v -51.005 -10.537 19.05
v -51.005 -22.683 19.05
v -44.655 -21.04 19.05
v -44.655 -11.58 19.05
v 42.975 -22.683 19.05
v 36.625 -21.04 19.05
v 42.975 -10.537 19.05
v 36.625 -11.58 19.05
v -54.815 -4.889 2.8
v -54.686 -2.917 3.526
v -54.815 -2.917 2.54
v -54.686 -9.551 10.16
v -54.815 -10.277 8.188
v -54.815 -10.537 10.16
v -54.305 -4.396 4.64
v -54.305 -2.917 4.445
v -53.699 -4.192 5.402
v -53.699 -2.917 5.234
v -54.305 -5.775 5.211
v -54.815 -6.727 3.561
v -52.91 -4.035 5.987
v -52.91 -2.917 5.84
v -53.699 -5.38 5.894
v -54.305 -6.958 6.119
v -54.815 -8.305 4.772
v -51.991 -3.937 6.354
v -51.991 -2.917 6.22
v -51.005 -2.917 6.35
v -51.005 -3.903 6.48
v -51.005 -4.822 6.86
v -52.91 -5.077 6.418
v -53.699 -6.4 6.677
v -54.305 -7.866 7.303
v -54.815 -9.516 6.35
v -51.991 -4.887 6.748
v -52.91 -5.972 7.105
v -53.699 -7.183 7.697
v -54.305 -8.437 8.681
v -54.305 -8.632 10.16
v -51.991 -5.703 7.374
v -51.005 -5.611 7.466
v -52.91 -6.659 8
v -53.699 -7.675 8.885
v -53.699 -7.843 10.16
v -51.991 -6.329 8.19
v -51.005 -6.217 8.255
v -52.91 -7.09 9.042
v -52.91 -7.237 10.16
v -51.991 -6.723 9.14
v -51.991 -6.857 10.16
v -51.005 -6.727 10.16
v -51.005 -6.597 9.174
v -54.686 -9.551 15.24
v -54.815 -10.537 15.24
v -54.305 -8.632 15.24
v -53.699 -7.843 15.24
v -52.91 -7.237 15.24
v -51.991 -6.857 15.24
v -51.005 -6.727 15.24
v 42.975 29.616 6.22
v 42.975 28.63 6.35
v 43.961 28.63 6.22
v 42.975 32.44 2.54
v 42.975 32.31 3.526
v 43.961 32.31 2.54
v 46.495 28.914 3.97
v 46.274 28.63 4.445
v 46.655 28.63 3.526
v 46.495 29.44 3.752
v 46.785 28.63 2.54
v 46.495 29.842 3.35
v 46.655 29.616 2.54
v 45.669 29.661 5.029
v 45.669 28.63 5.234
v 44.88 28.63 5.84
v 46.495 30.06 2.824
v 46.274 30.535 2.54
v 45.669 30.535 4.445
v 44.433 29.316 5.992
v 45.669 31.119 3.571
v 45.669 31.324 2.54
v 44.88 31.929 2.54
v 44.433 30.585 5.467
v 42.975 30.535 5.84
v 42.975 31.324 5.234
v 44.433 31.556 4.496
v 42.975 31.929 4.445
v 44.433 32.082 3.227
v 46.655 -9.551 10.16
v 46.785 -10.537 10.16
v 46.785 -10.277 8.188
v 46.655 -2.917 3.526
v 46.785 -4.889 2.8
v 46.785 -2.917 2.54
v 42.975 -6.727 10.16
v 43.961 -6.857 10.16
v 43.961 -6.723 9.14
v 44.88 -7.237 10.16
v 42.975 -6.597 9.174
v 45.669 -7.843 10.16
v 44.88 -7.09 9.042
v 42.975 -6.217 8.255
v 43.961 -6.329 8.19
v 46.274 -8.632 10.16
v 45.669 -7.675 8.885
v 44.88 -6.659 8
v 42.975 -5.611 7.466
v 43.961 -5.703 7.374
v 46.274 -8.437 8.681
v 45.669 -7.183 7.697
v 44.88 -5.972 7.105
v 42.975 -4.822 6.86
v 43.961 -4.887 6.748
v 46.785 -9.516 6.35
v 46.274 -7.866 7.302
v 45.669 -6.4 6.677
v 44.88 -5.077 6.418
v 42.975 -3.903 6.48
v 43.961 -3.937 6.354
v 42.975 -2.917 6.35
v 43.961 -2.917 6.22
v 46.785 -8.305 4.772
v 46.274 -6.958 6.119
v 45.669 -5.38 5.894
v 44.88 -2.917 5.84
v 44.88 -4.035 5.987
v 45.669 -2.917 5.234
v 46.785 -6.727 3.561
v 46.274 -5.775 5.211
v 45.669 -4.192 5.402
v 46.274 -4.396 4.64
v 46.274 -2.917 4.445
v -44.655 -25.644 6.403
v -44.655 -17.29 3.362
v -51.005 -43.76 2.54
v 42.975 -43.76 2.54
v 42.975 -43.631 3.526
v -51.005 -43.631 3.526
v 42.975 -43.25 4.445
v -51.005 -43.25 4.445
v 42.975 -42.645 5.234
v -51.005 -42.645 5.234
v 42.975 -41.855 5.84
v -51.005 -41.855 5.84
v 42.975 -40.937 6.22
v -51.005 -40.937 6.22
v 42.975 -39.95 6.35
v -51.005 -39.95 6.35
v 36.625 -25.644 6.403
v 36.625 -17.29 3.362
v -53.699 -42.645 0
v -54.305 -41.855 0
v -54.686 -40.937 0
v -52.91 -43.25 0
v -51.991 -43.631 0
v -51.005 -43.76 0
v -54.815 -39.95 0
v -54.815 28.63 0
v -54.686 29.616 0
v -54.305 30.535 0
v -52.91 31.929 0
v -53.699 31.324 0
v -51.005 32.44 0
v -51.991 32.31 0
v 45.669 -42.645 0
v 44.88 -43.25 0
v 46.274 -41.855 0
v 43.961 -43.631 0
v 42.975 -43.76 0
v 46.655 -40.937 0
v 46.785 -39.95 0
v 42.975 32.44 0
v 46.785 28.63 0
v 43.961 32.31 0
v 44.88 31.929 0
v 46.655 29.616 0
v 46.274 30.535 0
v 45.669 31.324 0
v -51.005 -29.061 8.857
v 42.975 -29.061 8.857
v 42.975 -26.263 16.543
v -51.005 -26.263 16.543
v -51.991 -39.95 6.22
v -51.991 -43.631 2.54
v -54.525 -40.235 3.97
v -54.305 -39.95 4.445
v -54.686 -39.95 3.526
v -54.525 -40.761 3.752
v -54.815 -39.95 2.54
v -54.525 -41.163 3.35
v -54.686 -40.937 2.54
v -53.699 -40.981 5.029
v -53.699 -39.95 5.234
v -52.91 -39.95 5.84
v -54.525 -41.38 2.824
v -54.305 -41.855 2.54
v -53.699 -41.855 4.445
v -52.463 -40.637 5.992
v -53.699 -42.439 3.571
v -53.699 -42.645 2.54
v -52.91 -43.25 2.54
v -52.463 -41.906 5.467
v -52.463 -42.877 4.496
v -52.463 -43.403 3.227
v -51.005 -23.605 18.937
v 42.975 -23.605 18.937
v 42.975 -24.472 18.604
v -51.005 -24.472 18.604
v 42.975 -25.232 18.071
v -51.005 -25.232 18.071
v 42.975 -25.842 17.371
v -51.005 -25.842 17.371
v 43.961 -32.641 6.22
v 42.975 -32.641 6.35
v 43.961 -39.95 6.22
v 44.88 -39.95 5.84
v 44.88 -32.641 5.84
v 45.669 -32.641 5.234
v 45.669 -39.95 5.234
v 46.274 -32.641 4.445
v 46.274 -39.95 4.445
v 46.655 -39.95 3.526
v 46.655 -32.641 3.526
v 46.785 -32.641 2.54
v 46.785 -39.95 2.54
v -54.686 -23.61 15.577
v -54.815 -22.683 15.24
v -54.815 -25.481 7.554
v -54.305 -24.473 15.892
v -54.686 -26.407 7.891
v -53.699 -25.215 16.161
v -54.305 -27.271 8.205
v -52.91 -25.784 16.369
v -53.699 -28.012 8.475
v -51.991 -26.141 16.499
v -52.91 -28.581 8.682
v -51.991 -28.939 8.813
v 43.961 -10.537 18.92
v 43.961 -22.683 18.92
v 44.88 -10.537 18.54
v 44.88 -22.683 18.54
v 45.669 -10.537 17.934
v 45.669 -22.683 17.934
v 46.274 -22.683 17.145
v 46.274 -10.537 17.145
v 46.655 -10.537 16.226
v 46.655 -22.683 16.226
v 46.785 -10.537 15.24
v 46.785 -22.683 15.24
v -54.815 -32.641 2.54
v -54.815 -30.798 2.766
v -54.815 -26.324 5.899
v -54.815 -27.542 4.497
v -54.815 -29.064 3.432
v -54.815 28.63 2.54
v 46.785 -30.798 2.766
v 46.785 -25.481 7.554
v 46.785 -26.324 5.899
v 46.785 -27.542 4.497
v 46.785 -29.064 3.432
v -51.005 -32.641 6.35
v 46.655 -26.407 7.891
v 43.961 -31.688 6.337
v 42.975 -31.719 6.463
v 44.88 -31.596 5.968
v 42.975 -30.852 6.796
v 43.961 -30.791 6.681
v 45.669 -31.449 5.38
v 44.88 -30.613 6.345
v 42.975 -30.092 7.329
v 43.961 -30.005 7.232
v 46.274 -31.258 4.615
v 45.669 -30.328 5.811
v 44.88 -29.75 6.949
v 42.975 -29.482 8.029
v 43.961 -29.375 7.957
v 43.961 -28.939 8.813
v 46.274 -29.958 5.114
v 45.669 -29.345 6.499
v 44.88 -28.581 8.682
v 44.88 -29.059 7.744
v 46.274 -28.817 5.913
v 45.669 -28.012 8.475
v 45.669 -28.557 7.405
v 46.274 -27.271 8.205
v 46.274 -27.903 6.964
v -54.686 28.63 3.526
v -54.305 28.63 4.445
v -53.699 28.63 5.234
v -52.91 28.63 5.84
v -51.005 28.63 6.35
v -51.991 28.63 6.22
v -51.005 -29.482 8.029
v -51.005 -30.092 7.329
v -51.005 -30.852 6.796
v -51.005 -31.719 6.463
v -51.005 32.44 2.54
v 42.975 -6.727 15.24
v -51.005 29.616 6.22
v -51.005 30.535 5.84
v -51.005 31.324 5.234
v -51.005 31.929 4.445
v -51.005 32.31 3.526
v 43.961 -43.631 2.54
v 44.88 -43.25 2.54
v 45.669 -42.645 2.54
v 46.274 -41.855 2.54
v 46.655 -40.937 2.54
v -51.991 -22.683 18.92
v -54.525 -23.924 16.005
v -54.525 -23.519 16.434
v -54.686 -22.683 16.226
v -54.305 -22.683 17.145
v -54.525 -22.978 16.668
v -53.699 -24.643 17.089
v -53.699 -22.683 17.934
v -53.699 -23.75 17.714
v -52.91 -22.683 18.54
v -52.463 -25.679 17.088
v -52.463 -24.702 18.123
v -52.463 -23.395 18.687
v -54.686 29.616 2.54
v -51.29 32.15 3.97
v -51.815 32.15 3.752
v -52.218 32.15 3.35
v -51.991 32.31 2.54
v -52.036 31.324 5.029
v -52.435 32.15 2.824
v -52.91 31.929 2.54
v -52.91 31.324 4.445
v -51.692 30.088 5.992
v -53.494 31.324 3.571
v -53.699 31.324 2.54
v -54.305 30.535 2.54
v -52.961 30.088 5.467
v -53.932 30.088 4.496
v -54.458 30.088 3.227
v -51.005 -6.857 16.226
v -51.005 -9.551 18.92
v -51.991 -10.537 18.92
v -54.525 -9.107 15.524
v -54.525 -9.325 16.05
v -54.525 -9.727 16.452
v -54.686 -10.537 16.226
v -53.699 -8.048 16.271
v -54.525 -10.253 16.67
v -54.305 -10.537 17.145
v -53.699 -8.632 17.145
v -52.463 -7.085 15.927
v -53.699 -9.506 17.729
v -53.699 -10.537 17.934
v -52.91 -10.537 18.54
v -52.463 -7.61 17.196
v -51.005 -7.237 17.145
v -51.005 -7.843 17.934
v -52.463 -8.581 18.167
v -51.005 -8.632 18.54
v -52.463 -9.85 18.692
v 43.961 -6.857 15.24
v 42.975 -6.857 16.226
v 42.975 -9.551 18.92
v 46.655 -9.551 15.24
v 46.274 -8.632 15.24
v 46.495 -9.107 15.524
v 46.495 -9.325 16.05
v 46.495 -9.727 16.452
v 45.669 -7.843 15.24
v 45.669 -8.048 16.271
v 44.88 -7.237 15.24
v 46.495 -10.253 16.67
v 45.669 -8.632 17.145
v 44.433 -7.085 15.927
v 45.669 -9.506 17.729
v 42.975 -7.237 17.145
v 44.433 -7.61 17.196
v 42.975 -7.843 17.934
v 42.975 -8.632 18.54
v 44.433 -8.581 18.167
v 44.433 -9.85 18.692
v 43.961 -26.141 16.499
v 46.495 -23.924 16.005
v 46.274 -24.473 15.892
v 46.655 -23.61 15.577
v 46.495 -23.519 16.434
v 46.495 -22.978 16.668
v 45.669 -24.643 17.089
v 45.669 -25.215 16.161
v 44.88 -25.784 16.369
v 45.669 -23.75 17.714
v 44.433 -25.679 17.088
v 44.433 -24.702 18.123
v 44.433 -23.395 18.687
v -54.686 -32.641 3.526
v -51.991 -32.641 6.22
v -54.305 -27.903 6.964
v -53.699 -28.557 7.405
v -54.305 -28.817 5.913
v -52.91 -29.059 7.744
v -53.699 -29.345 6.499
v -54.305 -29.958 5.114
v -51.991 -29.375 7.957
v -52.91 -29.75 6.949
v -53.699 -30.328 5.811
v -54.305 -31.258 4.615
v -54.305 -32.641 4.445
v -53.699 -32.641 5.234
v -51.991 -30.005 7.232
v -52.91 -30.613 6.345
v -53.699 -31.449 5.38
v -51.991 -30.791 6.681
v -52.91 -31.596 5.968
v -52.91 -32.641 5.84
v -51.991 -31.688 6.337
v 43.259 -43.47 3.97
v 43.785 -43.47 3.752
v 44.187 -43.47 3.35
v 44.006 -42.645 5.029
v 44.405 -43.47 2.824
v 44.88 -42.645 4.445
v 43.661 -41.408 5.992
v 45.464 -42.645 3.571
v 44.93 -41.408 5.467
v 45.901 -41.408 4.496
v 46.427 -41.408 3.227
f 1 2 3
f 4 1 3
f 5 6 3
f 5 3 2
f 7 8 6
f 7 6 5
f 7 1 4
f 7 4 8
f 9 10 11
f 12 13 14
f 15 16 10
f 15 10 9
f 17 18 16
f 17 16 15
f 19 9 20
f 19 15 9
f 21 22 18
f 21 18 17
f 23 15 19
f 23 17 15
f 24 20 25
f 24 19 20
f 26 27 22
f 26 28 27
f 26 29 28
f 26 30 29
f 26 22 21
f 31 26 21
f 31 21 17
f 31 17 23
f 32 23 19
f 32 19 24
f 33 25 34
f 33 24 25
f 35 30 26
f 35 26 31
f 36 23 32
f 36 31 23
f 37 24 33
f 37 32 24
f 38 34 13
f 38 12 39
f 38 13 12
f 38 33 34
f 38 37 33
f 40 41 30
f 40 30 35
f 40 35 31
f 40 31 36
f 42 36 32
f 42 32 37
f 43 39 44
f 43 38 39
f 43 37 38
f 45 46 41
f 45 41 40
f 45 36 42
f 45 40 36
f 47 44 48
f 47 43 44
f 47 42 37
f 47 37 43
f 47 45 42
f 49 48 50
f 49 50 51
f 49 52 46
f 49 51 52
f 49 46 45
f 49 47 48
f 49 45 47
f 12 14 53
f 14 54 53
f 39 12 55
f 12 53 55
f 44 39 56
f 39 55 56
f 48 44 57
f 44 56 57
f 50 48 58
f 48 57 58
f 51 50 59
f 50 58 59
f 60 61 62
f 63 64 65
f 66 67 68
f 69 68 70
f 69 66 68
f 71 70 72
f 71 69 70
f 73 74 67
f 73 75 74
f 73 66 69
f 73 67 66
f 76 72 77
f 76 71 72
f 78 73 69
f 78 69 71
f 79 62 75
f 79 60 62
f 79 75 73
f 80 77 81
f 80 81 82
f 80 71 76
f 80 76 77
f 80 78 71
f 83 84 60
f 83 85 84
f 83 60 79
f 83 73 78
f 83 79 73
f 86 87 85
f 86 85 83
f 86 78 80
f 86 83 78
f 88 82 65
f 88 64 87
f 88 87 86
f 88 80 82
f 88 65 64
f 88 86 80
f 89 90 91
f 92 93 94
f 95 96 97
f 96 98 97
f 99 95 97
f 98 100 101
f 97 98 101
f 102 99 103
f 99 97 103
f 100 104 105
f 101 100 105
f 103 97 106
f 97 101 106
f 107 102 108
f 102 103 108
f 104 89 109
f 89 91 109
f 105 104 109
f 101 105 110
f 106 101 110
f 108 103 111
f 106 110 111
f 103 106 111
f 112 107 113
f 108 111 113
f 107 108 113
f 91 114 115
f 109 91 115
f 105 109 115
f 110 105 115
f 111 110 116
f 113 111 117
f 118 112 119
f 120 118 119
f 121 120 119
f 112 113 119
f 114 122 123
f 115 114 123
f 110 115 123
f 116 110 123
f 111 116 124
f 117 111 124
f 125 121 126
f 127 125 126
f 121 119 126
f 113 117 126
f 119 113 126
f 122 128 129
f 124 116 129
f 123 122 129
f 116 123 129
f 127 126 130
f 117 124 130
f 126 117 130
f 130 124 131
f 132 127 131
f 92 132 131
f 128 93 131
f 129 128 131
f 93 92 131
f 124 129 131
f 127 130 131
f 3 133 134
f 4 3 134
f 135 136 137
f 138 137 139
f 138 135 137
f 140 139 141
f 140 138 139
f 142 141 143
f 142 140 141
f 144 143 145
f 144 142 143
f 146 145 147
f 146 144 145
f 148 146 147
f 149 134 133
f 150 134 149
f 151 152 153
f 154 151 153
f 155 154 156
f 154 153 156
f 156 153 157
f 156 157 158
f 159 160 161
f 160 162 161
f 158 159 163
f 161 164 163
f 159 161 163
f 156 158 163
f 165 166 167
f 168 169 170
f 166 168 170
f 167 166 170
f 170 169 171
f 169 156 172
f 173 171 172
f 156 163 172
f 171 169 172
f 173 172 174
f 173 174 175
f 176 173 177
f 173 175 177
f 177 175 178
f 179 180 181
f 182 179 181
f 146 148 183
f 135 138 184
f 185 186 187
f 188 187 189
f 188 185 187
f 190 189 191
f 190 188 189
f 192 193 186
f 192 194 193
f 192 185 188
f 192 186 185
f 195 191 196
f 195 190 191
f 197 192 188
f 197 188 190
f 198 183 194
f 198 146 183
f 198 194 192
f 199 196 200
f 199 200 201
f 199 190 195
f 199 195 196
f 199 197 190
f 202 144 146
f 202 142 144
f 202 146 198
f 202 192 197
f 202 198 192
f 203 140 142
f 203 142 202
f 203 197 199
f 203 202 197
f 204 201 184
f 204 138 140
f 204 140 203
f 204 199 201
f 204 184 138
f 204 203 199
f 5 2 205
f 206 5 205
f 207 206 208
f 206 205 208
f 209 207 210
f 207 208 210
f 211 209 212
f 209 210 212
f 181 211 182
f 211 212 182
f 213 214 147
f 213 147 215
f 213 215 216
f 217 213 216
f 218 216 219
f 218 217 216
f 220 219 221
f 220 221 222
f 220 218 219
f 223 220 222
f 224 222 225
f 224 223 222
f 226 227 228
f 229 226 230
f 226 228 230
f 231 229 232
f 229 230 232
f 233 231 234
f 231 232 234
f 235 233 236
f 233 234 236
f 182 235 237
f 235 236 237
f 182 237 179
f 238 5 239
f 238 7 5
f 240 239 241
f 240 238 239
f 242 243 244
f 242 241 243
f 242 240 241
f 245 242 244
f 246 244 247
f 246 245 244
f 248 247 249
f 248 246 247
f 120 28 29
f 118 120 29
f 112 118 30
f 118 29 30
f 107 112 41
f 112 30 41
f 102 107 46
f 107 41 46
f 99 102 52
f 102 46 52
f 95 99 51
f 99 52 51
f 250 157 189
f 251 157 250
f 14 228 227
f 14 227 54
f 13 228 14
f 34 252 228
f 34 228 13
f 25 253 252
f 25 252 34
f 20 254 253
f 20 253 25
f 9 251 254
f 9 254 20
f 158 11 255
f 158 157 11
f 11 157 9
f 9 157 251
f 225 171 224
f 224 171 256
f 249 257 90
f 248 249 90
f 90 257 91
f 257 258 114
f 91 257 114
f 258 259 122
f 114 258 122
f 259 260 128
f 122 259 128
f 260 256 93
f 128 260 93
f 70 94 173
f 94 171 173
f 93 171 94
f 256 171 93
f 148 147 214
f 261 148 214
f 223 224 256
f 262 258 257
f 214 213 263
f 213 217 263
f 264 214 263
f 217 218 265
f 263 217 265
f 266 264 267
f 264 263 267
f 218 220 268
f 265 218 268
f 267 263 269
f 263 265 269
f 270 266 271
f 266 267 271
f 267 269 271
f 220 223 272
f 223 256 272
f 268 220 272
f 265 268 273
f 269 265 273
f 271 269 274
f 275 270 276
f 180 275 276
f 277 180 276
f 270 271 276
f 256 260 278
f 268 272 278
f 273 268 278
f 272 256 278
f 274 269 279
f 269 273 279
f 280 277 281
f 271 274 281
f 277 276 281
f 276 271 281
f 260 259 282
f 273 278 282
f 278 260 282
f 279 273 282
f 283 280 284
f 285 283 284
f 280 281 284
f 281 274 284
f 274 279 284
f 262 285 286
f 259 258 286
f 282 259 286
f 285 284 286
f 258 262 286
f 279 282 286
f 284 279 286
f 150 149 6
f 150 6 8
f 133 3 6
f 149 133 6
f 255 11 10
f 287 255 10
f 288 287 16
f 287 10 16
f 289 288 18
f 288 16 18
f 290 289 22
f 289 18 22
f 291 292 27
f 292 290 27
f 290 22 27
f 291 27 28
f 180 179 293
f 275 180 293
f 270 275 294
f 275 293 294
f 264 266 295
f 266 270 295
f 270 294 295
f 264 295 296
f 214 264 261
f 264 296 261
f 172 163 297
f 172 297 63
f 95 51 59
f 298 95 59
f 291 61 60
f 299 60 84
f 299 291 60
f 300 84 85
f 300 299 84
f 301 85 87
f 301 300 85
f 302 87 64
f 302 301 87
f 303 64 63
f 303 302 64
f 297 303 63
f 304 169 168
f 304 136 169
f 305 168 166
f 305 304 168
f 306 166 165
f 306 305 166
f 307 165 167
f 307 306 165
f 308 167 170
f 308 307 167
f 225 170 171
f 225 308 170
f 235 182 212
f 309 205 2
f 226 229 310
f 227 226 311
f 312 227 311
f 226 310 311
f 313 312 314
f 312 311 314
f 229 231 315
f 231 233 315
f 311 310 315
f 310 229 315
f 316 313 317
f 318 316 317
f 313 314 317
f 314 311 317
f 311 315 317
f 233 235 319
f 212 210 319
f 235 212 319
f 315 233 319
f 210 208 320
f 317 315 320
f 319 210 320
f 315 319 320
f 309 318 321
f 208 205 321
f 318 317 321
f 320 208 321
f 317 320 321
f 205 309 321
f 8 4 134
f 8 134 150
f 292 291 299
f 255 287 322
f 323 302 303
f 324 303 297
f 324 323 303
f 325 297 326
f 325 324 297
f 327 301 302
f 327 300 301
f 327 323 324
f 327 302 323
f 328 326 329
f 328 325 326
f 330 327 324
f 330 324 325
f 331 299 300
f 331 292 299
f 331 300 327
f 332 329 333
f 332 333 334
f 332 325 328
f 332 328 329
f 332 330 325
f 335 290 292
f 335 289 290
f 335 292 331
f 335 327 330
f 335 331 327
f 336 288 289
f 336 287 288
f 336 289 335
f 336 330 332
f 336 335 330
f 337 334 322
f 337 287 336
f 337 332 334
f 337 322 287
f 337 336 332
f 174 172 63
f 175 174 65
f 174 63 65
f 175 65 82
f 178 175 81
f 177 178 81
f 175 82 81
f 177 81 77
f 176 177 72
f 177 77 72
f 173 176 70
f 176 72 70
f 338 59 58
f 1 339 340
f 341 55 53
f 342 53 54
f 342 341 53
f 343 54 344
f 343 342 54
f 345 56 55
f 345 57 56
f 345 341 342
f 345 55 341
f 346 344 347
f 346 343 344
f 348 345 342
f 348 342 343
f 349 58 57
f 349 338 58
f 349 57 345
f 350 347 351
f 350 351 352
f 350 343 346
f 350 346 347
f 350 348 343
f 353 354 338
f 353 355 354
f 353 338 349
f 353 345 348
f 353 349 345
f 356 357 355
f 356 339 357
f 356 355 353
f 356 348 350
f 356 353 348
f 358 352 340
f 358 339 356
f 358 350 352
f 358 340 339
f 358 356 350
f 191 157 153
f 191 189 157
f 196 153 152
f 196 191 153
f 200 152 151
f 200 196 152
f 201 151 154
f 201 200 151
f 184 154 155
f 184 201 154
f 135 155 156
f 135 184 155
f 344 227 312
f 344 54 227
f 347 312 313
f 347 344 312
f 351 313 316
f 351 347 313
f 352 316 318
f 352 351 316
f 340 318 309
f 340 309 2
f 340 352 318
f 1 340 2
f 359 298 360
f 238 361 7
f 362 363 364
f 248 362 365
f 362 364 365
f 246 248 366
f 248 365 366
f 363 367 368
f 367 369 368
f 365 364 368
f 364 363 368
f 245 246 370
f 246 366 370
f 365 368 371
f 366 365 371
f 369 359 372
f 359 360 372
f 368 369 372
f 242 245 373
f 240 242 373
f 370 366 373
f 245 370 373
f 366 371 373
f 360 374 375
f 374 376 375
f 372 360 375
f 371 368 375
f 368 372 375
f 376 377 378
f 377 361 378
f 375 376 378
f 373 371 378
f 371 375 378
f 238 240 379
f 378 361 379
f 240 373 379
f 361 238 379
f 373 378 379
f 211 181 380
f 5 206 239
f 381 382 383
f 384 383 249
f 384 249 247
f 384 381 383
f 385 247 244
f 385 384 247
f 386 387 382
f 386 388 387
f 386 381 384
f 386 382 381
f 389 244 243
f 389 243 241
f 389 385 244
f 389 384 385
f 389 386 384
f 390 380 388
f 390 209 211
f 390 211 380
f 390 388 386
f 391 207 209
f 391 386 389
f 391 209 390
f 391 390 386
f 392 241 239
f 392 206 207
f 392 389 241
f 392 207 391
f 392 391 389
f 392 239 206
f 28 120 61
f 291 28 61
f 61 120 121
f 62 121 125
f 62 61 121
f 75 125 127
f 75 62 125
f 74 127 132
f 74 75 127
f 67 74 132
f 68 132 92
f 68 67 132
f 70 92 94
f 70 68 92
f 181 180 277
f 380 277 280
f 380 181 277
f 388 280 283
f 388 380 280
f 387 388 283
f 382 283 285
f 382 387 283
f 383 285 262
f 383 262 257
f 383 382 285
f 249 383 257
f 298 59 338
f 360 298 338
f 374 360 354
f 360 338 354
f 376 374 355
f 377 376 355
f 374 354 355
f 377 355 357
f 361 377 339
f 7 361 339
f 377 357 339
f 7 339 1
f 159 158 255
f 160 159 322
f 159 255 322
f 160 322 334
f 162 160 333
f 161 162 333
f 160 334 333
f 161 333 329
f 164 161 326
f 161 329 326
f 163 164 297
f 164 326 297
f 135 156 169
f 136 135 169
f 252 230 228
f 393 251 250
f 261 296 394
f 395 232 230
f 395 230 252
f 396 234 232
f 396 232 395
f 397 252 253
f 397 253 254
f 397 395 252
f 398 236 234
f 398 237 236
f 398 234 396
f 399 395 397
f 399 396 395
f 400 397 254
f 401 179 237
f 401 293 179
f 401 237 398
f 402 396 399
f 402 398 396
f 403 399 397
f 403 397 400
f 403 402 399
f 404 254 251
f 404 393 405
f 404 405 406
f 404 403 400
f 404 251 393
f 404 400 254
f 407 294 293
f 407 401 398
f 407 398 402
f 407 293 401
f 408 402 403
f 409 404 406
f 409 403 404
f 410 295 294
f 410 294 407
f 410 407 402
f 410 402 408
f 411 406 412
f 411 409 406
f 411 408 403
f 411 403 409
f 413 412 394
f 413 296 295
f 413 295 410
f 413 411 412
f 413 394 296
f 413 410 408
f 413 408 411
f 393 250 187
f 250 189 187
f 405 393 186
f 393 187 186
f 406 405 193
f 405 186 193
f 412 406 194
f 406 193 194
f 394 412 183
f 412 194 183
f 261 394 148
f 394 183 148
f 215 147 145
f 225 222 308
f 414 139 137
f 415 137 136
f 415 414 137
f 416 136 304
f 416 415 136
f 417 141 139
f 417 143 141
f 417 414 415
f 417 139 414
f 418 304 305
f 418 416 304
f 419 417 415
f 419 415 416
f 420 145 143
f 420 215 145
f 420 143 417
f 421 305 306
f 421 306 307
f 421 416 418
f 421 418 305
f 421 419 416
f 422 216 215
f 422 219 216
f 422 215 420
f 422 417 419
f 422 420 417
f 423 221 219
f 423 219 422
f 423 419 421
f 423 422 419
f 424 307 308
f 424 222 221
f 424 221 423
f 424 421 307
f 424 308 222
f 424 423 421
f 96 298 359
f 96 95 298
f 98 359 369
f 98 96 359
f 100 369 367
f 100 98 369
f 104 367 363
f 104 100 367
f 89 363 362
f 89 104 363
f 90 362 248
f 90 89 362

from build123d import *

# Parameters (mm, degrees)
F0_W     = 101.6
F0_H     = 76.2
F1_DEPTH = 19.05
F3_W     = 81.28
F3_H     = 8.89
F4_DEPTH = 31.75
F5_W     = 39.1665739621
F5_H     = 12.7
F6_DEPTH = 101.601
F7_F1_R  = 3.81
F7_F2_R  = 3.81


with BuildPart() as f1:
    # F0 (on Top) → F1 (new body)
    with BuildSketch(Plane.XY):
        with Locations((-4.0153246373, -5.6604754616)):
            Rectangle(F0_W, F0_H)
    extrude(amount=F1_DEPTH)

    # F3 (on face) → F4 (cut)
    with BuildSketch(Plane(origin=(0, 9.9172554964, 27.2474355394), x_dir=(1, 0, 0), z_dir=(0, 0.3420201433, 0.9396926208))):
        with Locations((-4.0153246373, -21.8419839543)):
            Rectangle(F3_W, F3_H)
    extrude(amount=-F4_DEPTH, mode=Mode.SUBTRACT)

    # F5 (on face) → F6 (cut, through all)
    with BuildSketch(Plane.YZ.offset(46.7846753627)):
        Polygon((-29.9731970935, 6.35), (-25.3507751184, 19.05), (-43.7604754616, 19.05), (-43.7604754616, 6.35), align=None)
        with Locations((12.8562375574, 12.7)):
            Rectangle(F5_W, F5_H)
    extrude(amount=-F6_DEPTH, mode=Mode.SUBTRACT)

    # F7: fillet of radius 3.81 on 19 edges, made by hand

    # F7_f1
    f7_f1_edges = [f1.edges().sort_by_distance(p)[0] for p in [
        (-4.0153246373, -29.9731970935, 6.35),
        (-4.0153246373, -6.7270494237, 6.35),
    ]]
    fillet(f7_f1_edges, radius=F7_F1_R)

    # F7_f2
    f7_f2_edges = [f1.edges().sort_by_distance(p)[0] for p in [
        (-4.0153246373, -25.3507751184, 19.05),
        (-4.0153246373, -6.7270494237, 19.05),
        (46.7846753627, -38.2007316379, 6.35),
        (-4.0153246373, -43.7604754616, 6.35),
        (-54.8153246373, -38.2007316379, 6.35),
        (-54.8153246373, 14.7612375574, 6.35),
        (-4.0153246373, 32.4395245384, 6.35),
        (46.7846753627, 14.7612375574, 6.35),
        (46.7846753627, 32.4395245384, 3.175),
        (46.7846753627, -43.7604754616, 3.175),
        (-54.8153246373, -43.7604754616, 3.175),
        (-54.8153246373, -27.2057670236, 13.953451627),
        (-54.8153246373, -6.7270494237, 14.605),
        (46.7846753627, -27.2057670236, 13.953451627),
        (46.7846753627, -16.038912271, 19.05),
        (-54.8153246373, -16.038912271, 19.05),
        (-54.8153246373, 32.4395245384, 3.175),
        (46.7846753627, -30.4556615916, 7.0390307113),
        (-54.8153246373, -5.61112626, 7.4659231637),
        (-54.8153246373, -30.4556615916, 7.0390307113),
        (46.7846753627, -5.61112626, 7.4659231637),
    ]]
    fillet(f7_f2_edges, radius=F7_F2_R)


solid = f1.part
